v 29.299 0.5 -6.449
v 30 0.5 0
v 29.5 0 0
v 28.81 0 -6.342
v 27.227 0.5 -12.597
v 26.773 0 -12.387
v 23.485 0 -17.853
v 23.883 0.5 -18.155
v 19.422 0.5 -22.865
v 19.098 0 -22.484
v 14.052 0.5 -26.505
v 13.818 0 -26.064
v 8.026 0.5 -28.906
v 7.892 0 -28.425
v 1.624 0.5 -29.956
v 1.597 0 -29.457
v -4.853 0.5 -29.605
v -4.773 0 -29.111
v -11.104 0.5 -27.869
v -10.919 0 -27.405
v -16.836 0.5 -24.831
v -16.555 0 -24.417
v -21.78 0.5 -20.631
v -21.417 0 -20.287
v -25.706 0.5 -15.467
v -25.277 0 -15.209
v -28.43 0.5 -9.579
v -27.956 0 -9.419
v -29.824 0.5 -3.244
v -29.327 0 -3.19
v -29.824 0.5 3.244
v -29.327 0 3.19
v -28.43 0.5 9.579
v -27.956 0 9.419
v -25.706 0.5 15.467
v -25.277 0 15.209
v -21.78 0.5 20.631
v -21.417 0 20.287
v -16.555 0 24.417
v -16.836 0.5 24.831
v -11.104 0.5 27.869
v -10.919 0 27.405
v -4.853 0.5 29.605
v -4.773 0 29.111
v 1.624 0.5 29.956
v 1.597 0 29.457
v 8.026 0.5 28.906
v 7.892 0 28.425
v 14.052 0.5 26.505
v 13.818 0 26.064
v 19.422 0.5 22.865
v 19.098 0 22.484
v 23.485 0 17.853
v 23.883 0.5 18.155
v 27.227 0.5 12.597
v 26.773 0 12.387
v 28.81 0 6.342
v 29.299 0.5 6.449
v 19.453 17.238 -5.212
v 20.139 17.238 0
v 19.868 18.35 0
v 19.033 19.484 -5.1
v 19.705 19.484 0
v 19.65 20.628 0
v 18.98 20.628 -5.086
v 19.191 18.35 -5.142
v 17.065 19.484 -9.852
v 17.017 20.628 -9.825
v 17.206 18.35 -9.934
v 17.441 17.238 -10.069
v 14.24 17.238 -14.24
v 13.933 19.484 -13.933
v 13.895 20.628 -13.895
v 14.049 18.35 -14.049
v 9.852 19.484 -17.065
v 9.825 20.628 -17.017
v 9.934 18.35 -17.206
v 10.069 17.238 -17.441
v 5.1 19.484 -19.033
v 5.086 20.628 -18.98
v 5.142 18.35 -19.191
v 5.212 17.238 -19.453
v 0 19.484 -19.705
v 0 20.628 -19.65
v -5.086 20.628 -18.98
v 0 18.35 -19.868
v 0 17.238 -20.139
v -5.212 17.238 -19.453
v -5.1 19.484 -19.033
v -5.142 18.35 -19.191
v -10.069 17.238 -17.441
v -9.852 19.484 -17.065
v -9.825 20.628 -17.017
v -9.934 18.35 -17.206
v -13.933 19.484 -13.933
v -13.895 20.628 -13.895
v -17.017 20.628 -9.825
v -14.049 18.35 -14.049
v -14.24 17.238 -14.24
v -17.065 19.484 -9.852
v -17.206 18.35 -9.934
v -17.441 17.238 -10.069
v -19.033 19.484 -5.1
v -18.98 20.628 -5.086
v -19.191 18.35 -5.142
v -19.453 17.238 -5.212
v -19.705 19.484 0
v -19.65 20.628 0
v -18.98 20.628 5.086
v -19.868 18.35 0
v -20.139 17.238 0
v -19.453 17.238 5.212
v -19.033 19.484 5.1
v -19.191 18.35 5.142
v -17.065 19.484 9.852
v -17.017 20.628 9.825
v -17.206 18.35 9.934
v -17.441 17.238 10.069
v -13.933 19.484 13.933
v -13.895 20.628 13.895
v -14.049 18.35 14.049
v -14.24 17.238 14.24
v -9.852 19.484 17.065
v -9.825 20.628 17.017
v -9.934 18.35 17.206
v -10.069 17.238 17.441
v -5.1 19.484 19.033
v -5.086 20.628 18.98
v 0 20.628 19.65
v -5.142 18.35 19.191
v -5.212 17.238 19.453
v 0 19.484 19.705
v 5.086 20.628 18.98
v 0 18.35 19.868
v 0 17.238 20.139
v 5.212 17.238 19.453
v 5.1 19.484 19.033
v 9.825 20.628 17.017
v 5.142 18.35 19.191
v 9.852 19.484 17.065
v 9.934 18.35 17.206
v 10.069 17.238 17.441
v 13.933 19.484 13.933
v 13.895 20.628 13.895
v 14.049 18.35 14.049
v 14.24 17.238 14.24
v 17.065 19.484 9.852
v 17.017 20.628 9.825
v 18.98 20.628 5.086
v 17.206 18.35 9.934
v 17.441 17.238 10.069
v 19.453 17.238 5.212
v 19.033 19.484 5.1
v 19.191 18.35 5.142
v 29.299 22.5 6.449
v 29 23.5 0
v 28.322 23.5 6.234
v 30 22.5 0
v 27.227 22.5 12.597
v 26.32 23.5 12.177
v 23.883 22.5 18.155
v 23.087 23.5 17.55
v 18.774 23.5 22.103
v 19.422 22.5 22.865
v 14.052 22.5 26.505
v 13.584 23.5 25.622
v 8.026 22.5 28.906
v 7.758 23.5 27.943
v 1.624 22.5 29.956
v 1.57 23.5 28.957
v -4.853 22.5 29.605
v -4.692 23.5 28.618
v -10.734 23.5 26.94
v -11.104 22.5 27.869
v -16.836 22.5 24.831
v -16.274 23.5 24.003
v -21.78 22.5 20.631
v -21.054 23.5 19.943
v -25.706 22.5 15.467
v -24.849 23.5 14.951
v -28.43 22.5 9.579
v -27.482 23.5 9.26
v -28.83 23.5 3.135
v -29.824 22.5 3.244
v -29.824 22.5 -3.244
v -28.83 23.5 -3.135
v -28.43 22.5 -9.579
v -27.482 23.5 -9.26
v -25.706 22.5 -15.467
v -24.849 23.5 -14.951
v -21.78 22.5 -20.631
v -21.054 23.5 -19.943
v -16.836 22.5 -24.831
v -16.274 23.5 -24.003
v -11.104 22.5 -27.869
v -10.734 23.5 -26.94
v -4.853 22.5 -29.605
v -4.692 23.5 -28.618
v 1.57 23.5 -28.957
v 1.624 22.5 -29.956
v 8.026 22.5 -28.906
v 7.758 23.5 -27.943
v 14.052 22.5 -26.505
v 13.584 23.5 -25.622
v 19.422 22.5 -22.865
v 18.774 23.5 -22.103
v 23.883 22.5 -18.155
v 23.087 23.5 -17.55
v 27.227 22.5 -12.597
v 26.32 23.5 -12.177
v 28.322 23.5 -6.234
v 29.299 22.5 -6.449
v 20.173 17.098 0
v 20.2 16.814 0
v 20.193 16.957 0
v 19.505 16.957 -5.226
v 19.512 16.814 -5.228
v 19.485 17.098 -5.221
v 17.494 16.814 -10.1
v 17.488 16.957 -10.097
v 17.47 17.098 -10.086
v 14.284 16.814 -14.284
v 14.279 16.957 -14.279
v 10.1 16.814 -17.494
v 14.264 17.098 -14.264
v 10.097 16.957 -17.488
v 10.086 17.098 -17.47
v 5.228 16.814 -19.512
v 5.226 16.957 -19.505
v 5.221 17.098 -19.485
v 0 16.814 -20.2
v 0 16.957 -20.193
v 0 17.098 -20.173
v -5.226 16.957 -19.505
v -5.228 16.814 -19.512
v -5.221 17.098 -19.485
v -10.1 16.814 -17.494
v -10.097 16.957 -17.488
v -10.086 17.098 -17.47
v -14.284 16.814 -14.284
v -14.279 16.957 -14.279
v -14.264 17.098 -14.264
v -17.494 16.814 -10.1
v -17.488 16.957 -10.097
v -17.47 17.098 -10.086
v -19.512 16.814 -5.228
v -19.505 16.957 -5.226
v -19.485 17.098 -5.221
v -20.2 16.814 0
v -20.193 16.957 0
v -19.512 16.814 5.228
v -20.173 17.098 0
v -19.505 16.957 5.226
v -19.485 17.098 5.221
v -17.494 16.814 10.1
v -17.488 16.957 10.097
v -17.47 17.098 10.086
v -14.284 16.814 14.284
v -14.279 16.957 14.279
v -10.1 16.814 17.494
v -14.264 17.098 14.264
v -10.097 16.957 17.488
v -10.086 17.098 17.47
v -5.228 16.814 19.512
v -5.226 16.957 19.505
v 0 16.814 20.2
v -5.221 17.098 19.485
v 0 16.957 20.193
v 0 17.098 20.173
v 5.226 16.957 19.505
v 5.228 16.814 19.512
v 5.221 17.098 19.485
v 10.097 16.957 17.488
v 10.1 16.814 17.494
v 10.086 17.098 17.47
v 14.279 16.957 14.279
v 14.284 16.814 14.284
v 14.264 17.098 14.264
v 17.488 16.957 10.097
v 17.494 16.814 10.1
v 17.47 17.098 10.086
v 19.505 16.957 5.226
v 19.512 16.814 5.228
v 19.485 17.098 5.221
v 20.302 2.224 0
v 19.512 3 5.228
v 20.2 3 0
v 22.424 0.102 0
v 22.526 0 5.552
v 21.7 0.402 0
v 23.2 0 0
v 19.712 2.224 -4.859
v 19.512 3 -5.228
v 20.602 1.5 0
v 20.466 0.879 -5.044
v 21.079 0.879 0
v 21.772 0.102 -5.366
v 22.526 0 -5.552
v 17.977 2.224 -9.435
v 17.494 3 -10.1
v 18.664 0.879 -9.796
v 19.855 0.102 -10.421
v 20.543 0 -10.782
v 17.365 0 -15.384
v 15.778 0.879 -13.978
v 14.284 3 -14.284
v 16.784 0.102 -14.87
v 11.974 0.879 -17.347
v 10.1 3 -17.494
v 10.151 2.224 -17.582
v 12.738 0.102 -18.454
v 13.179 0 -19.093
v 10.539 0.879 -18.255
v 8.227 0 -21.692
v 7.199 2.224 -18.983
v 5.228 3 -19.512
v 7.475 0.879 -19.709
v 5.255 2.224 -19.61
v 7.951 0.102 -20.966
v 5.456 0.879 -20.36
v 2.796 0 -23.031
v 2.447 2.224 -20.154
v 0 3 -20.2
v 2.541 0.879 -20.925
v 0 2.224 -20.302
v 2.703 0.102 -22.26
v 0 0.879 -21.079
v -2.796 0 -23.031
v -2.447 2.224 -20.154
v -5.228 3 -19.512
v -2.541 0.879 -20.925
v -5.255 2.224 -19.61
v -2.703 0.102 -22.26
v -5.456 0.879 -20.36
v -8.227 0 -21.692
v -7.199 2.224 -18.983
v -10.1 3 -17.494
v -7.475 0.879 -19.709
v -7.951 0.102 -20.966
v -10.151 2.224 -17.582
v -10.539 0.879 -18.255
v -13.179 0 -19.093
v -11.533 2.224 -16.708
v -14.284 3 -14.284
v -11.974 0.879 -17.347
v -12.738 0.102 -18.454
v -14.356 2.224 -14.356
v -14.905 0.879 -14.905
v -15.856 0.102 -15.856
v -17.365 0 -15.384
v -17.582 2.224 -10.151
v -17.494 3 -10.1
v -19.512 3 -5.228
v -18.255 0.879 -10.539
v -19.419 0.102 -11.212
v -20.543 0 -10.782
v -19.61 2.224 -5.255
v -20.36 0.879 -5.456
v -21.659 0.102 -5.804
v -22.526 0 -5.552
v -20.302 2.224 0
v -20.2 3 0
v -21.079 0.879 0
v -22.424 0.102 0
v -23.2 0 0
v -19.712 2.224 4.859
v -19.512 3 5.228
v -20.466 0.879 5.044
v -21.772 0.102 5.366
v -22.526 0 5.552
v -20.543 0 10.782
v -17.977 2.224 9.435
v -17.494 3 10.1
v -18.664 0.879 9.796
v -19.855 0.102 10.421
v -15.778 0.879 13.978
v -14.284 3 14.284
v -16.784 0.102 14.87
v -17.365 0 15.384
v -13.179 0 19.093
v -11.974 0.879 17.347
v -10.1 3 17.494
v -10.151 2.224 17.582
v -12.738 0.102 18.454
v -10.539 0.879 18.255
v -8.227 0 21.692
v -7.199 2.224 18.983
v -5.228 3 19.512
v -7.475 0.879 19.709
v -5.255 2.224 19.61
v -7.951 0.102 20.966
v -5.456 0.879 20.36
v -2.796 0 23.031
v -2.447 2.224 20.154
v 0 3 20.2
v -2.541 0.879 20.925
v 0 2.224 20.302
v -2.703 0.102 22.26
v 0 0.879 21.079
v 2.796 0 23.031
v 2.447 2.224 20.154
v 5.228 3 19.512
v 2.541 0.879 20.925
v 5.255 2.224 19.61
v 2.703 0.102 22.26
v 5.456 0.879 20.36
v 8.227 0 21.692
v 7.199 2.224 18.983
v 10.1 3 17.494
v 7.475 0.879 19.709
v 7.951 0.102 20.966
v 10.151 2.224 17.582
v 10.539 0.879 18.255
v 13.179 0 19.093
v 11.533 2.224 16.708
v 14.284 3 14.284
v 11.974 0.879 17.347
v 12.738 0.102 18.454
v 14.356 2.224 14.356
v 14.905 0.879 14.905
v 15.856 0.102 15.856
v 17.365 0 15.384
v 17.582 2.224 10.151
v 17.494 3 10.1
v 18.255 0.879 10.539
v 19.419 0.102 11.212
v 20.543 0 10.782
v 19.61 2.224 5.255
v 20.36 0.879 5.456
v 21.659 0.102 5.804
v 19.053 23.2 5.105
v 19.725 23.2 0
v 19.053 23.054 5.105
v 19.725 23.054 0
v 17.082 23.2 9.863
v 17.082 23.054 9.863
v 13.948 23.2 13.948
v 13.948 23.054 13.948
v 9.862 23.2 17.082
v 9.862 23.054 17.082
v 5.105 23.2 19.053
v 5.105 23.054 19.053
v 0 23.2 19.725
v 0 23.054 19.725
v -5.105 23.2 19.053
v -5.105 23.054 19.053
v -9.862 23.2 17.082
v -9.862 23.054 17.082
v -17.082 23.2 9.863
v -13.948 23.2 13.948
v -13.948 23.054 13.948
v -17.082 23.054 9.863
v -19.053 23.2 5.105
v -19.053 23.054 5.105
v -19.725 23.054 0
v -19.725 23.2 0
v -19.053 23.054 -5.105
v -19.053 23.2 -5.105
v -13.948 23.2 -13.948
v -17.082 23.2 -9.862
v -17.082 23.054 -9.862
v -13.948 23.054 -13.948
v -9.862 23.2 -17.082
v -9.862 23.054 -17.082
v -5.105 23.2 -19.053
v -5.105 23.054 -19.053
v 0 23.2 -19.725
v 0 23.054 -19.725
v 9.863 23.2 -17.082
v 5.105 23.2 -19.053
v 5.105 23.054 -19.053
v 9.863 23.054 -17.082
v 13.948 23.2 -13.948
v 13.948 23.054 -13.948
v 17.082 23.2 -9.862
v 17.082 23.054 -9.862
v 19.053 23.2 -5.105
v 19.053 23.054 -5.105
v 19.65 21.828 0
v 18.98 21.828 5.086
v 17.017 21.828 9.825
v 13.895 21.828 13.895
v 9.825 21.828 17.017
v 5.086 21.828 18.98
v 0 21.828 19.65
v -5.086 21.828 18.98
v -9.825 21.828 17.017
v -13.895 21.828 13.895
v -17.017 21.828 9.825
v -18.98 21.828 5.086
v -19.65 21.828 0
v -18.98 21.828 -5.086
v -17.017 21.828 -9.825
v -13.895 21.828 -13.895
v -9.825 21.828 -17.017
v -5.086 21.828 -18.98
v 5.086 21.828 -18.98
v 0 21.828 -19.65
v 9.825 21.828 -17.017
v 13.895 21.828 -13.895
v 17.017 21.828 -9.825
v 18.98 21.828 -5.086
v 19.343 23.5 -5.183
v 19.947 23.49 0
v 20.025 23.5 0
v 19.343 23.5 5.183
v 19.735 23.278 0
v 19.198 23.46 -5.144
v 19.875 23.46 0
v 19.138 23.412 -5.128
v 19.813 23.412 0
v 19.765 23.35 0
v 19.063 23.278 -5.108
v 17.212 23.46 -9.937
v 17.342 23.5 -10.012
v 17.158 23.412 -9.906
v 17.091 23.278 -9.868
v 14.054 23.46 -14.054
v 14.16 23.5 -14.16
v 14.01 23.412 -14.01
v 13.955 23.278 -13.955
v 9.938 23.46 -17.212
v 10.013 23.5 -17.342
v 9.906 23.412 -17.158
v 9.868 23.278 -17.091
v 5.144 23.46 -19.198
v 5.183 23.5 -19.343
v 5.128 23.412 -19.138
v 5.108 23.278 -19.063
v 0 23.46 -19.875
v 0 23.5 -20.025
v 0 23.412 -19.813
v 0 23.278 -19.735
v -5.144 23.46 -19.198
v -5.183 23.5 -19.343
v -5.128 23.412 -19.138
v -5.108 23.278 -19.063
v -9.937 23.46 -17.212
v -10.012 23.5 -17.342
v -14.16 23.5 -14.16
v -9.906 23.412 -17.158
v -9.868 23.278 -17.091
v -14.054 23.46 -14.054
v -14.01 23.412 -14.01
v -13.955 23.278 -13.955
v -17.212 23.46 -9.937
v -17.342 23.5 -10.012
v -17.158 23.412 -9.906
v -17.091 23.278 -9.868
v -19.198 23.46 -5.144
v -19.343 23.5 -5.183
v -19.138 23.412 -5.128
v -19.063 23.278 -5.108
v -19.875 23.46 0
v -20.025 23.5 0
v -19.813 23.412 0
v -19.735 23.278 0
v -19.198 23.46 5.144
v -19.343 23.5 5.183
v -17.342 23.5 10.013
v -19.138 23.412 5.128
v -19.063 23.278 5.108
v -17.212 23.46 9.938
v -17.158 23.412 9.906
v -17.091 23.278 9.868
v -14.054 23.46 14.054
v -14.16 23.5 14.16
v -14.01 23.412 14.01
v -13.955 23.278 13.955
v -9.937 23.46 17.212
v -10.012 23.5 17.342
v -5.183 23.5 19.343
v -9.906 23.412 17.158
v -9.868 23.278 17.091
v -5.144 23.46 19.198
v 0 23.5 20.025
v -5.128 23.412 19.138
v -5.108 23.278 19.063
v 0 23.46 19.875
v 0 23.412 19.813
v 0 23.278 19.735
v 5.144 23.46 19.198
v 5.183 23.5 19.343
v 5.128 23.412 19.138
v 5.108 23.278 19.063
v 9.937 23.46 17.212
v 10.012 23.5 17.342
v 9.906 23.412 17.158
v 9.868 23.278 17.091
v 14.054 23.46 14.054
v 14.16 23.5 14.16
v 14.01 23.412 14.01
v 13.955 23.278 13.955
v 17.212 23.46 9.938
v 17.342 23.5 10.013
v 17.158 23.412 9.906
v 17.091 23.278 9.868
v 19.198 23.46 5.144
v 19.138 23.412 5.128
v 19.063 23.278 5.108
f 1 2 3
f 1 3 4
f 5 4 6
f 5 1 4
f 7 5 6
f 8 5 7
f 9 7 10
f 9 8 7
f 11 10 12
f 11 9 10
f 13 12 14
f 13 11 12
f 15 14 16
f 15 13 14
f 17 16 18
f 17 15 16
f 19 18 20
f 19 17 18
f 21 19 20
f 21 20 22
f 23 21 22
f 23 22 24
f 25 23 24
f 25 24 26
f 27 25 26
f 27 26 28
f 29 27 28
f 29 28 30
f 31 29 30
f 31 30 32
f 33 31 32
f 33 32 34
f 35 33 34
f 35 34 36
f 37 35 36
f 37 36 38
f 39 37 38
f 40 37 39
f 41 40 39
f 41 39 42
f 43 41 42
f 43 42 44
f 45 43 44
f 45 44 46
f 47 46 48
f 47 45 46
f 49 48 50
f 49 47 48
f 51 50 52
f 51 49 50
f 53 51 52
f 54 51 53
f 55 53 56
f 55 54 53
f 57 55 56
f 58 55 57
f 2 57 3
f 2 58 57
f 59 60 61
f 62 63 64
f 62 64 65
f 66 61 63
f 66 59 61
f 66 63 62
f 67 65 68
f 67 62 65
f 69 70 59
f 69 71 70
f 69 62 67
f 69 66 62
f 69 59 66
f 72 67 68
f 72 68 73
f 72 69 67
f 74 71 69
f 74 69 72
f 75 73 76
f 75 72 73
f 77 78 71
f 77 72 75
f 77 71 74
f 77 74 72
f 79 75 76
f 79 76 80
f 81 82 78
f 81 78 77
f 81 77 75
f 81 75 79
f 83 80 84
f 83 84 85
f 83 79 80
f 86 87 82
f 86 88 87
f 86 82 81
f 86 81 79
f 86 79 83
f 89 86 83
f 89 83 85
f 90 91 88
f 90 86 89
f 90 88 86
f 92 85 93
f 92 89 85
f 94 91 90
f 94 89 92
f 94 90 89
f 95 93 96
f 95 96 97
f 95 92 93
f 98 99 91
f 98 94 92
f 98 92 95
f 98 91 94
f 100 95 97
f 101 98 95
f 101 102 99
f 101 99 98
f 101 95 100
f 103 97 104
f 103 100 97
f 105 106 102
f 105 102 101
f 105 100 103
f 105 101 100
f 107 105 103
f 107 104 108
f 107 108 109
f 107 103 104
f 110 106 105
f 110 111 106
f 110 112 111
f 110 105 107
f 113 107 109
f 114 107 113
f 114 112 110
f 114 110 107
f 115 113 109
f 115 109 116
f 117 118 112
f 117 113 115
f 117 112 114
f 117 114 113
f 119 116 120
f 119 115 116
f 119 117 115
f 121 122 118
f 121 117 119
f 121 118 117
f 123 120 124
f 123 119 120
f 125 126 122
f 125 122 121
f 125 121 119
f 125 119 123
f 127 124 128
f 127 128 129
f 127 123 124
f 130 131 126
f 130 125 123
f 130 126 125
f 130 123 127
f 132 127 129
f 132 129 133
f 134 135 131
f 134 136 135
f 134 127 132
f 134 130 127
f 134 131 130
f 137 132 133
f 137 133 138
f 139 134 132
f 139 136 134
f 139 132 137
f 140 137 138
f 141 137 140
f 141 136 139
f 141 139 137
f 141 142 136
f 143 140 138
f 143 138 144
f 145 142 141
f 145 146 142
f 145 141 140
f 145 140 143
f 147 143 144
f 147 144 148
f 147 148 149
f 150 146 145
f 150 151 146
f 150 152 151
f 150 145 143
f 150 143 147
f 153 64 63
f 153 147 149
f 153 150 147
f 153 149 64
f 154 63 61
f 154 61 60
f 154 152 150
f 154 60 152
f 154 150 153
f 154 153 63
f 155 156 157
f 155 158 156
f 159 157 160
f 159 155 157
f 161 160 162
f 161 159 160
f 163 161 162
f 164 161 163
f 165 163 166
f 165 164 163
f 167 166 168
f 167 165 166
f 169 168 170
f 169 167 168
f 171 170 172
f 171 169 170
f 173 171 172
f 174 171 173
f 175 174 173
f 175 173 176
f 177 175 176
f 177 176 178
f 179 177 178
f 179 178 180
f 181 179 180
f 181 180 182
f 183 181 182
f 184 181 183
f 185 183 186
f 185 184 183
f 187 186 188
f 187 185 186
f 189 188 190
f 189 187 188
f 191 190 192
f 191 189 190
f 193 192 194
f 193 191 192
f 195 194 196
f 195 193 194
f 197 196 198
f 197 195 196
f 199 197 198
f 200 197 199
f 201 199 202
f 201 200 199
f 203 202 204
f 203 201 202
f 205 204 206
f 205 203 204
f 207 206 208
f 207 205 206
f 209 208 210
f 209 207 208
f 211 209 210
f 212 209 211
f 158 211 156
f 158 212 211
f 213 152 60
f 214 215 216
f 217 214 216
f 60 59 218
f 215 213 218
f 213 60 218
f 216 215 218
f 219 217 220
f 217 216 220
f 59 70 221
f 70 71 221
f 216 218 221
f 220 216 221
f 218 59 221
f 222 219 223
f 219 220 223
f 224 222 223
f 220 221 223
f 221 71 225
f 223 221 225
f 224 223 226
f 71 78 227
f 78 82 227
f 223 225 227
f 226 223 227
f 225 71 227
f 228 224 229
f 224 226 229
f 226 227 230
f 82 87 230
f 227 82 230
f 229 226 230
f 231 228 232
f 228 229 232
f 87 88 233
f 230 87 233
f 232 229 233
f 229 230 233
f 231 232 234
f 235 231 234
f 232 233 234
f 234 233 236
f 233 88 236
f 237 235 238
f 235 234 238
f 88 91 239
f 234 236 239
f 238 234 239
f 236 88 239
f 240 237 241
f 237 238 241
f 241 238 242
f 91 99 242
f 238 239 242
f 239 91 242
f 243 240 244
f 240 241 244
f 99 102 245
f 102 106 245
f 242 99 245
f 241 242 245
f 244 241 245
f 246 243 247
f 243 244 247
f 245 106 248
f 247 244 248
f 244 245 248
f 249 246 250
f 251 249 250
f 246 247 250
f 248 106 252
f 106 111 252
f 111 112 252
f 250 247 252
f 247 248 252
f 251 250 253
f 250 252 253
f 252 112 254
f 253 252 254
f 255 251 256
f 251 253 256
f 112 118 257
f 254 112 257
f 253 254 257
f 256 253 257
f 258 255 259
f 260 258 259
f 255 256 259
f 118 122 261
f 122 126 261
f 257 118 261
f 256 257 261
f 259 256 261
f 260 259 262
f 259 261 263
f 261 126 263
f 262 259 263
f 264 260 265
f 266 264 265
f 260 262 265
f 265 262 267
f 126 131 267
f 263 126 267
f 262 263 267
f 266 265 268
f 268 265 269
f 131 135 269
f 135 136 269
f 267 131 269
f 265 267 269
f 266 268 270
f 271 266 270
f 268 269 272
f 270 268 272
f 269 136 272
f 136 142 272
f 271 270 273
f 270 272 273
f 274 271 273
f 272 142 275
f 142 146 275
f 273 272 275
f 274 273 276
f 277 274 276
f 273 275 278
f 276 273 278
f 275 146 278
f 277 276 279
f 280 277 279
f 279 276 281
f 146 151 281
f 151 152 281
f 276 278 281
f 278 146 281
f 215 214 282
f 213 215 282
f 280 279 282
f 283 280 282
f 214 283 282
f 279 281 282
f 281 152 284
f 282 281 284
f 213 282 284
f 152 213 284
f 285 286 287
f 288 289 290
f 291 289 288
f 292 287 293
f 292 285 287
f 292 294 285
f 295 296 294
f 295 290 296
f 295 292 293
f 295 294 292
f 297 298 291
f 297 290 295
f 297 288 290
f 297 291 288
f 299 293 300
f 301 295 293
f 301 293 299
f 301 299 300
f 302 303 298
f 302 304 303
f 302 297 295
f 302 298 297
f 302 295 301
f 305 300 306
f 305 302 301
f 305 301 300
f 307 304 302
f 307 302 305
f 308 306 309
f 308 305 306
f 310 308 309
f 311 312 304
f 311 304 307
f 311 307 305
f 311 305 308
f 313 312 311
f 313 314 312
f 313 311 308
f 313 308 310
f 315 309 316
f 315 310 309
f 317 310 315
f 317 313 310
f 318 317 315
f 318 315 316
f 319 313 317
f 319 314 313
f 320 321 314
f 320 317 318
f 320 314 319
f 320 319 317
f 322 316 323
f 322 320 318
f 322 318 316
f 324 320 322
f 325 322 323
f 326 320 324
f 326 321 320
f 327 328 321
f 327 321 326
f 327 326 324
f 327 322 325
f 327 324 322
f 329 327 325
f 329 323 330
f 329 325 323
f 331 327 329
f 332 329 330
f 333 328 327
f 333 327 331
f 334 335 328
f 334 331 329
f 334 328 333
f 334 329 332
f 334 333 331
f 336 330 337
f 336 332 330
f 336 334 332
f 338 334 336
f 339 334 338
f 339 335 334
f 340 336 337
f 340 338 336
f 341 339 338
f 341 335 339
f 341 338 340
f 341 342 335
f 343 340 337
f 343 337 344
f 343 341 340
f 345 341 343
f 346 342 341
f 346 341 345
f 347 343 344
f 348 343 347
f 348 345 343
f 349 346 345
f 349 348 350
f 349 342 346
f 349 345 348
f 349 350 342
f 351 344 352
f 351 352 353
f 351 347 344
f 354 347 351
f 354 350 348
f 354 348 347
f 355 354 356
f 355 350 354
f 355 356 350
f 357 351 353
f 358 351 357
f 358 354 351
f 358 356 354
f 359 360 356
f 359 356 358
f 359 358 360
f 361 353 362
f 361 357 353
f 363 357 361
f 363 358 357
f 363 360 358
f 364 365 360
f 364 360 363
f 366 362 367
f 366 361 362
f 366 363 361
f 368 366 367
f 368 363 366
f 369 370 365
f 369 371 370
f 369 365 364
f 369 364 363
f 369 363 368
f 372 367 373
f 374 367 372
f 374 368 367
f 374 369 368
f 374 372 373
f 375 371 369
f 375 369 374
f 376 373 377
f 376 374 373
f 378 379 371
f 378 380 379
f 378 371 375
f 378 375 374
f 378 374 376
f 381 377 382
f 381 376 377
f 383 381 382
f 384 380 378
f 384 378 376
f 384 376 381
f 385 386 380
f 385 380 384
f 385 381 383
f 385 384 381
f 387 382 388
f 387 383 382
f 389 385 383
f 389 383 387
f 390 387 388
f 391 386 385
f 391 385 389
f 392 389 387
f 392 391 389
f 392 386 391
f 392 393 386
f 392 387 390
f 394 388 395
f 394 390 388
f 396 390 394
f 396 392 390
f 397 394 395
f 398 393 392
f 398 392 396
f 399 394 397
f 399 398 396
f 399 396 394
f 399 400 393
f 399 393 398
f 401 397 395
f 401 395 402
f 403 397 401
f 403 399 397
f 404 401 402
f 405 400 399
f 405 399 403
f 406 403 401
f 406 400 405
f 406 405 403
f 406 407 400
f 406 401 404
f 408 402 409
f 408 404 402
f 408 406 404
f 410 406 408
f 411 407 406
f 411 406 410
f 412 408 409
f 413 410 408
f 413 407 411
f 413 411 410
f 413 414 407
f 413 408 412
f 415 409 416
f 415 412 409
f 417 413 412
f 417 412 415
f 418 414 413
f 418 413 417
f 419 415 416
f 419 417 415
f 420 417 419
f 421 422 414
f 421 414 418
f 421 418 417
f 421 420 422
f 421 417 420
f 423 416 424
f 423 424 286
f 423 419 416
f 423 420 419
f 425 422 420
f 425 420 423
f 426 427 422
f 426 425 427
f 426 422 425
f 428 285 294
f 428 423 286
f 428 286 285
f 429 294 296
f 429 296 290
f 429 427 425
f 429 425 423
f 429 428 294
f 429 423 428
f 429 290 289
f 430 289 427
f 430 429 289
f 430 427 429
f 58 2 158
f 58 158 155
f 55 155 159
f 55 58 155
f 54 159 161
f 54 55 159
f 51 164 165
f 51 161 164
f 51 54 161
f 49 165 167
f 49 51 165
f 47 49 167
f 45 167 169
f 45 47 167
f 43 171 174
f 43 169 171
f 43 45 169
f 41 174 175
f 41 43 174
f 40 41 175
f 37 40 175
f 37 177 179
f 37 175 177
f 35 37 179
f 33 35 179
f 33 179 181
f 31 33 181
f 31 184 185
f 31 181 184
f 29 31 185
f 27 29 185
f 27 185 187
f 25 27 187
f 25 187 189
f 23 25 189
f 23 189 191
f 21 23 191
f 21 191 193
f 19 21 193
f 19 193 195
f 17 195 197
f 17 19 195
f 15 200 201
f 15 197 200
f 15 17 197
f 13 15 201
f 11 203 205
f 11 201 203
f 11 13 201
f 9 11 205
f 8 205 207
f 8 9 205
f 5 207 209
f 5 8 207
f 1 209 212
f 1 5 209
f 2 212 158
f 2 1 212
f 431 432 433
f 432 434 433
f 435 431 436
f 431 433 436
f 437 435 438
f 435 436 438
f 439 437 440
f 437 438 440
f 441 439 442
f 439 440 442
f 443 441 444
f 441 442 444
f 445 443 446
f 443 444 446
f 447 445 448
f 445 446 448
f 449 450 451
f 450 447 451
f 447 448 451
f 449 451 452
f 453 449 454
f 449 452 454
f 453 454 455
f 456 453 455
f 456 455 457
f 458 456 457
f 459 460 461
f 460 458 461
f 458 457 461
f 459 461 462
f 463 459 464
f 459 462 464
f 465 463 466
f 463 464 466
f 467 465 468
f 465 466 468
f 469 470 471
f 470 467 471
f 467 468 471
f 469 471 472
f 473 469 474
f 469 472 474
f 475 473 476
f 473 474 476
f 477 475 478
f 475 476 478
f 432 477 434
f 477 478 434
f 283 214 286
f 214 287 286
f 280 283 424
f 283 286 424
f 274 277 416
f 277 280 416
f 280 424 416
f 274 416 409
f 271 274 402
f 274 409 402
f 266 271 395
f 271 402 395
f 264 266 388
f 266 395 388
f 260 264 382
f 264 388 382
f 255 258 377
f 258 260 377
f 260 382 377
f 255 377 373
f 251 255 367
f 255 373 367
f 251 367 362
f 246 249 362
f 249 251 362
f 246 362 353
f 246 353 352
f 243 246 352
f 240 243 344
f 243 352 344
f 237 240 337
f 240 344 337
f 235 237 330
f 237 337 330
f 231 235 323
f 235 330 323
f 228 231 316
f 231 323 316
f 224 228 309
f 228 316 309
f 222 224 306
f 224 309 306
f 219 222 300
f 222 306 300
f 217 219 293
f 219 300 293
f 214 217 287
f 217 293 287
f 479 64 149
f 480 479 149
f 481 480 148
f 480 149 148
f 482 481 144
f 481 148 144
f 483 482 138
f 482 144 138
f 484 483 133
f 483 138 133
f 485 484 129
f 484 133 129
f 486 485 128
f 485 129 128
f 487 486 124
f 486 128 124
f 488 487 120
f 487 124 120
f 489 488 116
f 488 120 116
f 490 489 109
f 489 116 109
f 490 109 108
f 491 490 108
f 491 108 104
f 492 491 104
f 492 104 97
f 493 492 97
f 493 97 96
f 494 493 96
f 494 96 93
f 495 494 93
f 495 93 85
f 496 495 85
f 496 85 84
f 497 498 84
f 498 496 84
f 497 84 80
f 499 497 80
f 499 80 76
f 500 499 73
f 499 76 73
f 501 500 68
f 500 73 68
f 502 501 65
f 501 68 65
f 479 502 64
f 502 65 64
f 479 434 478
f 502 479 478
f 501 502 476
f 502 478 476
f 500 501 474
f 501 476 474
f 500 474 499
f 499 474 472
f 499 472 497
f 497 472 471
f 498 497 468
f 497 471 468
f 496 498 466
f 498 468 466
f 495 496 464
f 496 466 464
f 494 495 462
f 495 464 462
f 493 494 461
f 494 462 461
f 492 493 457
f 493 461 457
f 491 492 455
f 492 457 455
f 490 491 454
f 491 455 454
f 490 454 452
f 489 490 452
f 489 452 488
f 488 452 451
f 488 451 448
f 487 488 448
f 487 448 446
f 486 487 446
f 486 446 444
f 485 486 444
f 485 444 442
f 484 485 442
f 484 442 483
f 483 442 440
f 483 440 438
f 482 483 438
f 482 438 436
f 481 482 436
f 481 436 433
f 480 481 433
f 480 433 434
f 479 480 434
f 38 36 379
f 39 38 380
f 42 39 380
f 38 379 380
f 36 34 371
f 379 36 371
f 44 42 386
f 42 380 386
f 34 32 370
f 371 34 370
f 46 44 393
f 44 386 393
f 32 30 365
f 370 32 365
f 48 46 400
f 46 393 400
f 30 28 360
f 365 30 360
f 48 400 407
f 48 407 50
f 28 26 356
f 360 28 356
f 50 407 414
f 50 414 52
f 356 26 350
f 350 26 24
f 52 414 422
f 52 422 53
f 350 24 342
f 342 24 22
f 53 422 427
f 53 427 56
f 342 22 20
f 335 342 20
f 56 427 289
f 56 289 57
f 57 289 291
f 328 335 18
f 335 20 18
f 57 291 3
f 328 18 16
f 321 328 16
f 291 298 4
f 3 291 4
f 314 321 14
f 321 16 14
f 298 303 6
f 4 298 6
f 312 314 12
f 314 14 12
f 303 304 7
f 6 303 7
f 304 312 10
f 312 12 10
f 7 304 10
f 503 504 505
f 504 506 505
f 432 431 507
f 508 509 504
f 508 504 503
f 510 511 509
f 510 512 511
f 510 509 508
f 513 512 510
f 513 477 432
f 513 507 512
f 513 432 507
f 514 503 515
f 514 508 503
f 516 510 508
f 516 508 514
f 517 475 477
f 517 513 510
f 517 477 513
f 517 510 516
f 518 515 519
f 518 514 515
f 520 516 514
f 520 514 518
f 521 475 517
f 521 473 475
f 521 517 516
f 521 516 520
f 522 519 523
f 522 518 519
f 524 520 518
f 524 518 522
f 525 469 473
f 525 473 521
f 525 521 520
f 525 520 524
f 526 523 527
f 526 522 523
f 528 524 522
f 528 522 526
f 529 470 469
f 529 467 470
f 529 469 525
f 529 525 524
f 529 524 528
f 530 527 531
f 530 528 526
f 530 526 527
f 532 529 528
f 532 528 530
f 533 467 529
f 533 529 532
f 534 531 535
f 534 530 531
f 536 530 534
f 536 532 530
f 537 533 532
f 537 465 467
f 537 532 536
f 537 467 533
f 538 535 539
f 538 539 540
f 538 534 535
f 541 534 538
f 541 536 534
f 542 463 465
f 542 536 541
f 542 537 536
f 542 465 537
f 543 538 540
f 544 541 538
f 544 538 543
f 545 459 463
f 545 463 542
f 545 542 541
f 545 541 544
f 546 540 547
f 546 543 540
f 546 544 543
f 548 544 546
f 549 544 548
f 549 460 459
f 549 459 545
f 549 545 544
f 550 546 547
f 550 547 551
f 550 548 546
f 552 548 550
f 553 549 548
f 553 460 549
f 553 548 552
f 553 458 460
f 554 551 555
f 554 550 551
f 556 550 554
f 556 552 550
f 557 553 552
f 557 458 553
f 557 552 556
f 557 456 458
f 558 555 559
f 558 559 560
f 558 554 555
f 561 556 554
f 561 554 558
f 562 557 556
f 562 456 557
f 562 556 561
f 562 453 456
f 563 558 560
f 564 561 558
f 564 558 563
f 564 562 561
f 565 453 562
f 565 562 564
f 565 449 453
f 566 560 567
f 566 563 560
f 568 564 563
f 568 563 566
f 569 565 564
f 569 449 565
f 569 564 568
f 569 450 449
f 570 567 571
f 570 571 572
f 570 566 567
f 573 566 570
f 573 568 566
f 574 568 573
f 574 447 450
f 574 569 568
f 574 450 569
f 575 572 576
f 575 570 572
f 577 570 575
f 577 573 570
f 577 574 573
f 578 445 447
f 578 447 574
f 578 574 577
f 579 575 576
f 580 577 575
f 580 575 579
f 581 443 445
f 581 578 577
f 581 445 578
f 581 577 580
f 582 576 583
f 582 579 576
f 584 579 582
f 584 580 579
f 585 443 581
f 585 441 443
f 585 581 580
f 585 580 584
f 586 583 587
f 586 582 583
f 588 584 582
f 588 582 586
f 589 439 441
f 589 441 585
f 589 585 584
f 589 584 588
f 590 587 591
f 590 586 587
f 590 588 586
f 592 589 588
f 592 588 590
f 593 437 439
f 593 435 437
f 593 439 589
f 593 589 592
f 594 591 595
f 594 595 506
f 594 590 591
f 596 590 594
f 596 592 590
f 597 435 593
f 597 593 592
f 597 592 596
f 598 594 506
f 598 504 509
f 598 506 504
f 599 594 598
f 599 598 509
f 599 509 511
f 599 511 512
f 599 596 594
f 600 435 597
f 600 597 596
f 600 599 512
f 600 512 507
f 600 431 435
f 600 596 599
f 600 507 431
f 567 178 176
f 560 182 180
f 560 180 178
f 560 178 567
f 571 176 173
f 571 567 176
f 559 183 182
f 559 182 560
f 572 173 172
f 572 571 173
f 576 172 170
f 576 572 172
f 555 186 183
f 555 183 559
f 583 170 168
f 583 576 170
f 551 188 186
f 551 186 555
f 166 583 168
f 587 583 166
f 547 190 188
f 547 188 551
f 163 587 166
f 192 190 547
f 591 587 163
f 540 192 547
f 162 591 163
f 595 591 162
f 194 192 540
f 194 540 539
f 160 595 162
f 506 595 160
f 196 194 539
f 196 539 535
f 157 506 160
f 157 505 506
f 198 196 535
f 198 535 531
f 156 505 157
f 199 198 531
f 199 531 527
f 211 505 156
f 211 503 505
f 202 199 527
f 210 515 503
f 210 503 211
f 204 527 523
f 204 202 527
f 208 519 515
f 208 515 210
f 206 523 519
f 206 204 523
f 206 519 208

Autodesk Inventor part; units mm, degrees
ref_plane "YZ Plane" through (0, 0, 0) normal (1, 0, 0) x (0, 1, 0)
ref_plane "XZ Plane" through (0, 0, 0) normal (0, 1, 0) x (-1, 0, 0)
ref_plane "XY Plane" through (0, 0, 0) normal (0, 0, 1) x (1, 0, 0)
sketch "Náčrt1" plane through (0, 0, 0) normal (0, 0, 1) x (1, 0, 0)
  line L0 (0, 0) -> (0, 63.6053)
  line L1 (20.025, 23.5) -> (30, 23.5)
  line L2 (30, 23.5) -> (30, 0)
  line L3 (30, 0) -> (23.2, 0)
  arc A0 (20.2, 16.8138) -> (20.1389, 17.2376) centre (18.7, 16.8138) ccw
  arc A1 (19.65, 20.6279) -> (20.1389, 17.2376) centre (31.65, 20.6279) ccw
  arc A2 (20.2, 3) -> (23.2, 0) centre (23.2, 3) ccw
  line L4 (20.2, 16.8138) -> (20.2, 3)
  arc A3 (20.1, 16.9) -> (19.65, 18.2) centre (18.6153, 17.114) ccw construction
  arc A4 (19.2447, 18.8659) -> (19.65, 18.2) centre (20.6847, 19.286) ccw construction
  arc A5 (19.2447, 18.8659) -> (18.8277, 19.5429) centre (17.8047, 18.4458) ccw construction
  line L5 (13.5384, 24.4753) -> (18.8277, 19.5429) construction
  arc A6 (18.8277, 19.5429) -> (13.5384, 24.4753) centre (7.4354, 12.6284) ccw construction
  arc A7 (20.025, 23.5) -> (19.725, 23.2) centre (20.025, 23.2) ccw
  line L6 (19.65, 21.8279) -> (19.65, 20.6279)
  line L7 (19.65, 21.8279) -> (19.725, 23.0541)
  line L8 (19.65, 21.8279) -> (20.8785, 21.8279) construction
  line L9 (19.725, 23.2) -> (19.725, 23.0541)
  point P0 (19.7148, 23.5)
  dimension "d0" = 60
  dimension "d1" = 40.4
  dimension "d3" = 23.5
  dimension "d8" = 1.5
  dimension "d9" = 12
  dimension "d11" = 3
  dimension "d13" = 21.8279
  dimension "d30" = 16.8138
  dimension "d39" = 0.5
  dimension "d41" = 0.3
  dimension "d43" = 1.2
  dimension "d44" = 39.3
  dimension "d45" = 86.5
  dimension "d46" = 39.45
revolve "Rotace1" add sketch "Náčrt1" angle 360 about axis through (0, 0, 0) along (0, 1, 0)
chamfer "Zkosení1" distance 0.5 angle 45 1 edges at (-30, 0, 0)
chamfer "Zkosení3" distance 1 angle 45 1 edges at (-30, 23.5, 0)
equation "\"Rozmer_B\" = 23.5"
equation "\"Rozmer_C\" = 0"
equation "\"Rozmer_D\" = 23.5"
properties part number "NA-45-h-Crown-127" material "19 436.4"
